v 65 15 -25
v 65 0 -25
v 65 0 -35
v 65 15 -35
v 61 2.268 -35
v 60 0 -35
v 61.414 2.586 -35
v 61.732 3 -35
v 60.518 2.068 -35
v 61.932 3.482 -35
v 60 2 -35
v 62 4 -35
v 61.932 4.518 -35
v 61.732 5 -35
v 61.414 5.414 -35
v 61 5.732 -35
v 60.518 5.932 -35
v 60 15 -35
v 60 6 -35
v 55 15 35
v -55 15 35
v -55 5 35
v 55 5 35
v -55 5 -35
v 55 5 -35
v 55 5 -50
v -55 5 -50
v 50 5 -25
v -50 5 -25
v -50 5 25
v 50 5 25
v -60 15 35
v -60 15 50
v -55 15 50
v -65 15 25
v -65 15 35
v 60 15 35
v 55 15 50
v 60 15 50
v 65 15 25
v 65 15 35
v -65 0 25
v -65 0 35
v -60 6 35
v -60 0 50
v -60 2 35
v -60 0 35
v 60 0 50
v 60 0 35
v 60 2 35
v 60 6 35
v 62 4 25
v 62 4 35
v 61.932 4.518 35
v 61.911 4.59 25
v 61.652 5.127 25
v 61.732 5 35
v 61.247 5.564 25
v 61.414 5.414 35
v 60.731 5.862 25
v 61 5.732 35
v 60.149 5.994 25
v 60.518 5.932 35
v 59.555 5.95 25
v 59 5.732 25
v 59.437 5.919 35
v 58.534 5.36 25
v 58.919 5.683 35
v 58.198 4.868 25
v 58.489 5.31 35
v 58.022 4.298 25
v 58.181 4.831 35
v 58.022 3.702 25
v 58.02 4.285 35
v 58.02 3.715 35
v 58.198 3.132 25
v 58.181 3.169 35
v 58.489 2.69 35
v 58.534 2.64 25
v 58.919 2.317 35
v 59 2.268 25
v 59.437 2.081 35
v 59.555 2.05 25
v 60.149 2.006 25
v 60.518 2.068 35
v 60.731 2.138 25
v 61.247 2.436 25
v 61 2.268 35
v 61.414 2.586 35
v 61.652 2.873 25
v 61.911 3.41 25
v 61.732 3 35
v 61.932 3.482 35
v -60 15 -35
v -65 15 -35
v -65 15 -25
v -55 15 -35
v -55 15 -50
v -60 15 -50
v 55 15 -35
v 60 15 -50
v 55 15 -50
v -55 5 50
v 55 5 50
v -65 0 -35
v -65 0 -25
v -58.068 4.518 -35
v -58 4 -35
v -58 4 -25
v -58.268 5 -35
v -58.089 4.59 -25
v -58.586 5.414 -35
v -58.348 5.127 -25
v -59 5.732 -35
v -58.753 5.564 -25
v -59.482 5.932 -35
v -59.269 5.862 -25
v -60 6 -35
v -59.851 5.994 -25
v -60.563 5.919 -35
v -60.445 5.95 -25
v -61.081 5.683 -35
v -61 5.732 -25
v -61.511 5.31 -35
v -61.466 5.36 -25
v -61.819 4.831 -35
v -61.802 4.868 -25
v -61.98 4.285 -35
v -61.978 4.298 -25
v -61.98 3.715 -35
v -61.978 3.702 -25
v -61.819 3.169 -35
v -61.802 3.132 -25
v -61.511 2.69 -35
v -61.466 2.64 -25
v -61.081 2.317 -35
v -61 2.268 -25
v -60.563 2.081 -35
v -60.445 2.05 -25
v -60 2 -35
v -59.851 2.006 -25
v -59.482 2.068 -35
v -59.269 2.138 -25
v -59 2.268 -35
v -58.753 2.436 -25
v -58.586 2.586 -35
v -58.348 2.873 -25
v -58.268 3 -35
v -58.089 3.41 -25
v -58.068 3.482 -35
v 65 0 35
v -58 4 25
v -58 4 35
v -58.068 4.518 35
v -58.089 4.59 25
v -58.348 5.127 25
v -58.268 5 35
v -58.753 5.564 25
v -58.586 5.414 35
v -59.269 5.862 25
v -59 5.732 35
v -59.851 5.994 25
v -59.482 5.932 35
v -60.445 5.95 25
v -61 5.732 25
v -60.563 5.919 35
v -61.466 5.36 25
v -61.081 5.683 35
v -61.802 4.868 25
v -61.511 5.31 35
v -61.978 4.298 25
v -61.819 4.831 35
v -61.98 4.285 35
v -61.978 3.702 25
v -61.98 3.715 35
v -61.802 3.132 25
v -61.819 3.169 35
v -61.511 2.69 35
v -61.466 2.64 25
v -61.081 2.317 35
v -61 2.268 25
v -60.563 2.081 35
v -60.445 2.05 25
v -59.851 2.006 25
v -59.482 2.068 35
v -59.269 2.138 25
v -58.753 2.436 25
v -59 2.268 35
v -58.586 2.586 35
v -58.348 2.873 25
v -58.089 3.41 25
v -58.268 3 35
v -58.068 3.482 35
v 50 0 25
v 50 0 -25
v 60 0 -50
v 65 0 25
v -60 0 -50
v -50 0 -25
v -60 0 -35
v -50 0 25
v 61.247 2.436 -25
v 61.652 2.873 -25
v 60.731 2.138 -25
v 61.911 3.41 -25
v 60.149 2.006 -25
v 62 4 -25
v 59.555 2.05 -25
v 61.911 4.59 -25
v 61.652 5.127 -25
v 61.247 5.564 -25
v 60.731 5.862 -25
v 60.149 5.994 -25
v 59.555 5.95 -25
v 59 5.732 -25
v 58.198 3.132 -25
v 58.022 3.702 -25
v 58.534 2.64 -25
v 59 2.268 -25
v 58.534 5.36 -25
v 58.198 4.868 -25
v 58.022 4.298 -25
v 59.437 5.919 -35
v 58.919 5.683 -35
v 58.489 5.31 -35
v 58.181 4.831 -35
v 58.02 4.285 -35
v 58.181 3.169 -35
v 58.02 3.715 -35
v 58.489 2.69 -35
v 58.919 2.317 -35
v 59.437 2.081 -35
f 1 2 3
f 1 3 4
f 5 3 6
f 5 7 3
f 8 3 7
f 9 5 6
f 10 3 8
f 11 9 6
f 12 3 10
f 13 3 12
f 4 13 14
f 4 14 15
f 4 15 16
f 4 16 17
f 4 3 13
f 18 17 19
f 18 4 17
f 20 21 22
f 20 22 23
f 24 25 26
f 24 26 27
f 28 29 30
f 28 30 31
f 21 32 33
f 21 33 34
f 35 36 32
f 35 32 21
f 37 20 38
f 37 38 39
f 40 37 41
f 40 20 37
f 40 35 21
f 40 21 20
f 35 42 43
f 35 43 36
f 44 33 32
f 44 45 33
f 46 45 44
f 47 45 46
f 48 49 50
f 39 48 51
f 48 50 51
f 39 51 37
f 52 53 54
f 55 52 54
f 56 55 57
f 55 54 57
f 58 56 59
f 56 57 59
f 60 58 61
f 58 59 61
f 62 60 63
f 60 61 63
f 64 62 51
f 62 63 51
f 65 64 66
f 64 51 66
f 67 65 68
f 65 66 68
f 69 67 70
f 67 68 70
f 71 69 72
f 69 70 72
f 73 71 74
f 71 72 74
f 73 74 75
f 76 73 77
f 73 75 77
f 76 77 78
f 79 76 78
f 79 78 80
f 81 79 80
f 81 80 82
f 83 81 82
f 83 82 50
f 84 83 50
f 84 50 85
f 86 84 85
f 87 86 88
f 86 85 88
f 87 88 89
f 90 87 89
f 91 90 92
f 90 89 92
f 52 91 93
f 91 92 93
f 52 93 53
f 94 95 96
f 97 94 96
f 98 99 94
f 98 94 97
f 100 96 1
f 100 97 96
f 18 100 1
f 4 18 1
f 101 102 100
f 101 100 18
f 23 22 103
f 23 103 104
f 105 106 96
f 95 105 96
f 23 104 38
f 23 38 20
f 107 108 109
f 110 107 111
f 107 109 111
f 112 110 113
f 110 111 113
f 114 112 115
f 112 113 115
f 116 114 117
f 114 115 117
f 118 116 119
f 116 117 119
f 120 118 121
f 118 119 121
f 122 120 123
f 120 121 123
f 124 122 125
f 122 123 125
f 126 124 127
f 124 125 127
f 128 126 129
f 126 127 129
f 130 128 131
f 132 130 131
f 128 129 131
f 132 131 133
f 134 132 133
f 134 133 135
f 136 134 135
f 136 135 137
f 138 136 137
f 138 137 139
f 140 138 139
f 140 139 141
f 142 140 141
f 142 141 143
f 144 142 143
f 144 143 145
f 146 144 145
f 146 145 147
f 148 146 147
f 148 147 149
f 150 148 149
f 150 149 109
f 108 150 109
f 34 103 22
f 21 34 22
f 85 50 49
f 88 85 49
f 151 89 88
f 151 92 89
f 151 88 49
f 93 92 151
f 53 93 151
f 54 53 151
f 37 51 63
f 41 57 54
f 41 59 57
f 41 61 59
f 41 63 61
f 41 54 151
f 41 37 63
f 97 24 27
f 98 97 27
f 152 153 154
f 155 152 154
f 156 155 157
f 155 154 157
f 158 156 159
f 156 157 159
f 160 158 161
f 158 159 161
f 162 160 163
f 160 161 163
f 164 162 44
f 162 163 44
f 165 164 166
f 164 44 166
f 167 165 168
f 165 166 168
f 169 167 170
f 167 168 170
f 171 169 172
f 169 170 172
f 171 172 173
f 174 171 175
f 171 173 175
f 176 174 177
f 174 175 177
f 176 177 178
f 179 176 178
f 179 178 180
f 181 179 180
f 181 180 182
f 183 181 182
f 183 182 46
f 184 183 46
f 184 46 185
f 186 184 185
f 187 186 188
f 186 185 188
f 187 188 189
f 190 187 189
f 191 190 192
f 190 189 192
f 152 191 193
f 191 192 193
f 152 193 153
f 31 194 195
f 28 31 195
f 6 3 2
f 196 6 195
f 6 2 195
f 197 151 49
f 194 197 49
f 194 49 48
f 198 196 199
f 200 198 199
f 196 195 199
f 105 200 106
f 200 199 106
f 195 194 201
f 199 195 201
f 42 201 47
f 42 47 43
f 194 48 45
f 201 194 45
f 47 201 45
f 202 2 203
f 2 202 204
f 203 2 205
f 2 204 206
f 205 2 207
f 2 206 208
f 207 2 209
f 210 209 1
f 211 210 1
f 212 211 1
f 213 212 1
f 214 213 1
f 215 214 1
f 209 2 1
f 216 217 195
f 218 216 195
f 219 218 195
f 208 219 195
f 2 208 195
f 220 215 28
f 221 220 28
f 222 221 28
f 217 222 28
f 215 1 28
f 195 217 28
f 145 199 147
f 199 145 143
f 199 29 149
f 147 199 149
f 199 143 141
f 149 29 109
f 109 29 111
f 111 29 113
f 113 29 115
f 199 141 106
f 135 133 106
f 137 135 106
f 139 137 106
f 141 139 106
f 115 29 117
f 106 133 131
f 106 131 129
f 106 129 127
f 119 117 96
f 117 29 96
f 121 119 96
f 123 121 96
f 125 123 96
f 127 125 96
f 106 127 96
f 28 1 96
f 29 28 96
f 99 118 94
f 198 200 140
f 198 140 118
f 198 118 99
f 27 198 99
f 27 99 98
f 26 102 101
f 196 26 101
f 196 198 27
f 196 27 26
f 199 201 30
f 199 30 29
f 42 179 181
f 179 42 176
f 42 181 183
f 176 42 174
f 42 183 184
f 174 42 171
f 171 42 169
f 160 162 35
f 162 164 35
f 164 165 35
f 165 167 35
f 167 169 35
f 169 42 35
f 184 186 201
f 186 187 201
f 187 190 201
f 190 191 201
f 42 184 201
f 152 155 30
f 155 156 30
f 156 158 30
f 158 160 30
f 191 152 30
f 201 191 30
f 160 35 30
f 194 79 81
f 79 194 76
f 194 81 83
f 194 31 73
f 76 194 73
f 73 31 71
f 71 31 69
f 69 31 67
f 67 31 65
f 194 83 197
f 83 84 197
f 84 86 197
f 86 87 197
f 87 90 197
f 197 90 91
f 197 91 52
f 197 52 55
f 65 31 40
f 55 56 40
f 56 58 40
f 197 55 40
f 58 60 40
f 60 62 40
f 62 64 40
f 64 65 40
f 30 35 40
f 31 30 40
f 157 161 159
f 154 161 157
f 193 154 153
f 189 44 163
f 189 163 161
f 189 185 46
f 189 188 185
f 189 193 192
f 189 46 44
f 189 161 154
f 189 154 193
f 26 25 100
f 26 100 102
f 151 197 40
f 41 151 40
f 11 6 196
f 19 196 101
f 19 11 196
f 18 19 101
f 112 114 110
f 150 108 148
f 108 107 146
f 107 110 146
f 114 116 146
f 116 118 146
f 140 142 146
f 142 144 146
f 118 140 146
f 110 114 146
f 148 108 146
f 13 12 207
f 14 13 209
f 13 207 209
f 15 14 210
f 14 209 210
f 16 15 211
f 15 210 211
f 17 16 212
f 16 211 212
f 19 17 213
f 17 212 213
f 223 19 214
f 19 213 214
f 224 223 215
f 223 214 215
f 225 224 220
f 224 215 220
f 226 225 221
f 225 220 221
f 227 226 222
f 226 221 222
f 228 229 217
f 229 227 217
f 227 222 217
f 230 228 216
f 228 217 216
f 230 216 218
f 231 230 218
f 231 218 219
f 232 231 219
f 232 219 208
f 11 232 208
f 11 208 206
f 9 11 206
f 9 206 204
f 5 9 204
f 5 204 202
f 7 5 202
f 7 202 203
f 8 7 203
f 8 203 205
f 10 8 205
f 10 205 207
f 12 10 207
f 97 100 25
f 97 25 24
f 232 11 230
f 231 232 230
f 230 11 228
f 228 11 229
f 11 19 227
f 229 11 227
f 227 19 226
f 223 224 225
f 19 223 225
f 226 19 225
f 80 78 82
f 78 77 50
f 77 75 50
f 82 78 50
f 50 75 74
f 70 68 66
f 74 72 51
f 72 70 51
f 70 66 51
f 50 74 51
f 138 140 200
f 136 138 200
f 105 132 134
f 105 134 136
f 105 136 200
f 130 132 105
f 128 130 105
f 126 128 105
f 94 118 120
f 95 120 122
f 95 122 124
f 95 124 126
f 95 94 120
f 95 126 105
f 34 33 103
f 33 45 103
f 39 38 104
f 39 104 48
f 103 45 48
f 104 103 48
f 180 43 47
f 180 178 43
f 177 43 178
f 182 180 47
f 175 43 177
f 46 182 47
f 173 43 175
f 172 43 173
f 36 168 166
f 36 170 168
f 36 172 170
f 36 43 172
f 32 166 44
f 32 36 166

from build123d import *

# Parameters (mm, degrees)
SKETCH1_W           = 100
SKETCH1_H           = 50
BOSS_EXTRUDE1_DEPTH = 5
SKETCH2_W           = 130
SKETCH2_H           = 15
BOSS_EXTRUDE2_DEPTH = 10
SKETCH3_W           = 130
SKETCH3_H           = 15
BOSS_EXTRUDE3_DEPTH = 10
SKETCH4_R           = 2
CUT_EXTRUDE1_DEPTH  = 97.695398029
SKETCH5_R           = 2
CUT_EXTRUDE2_DEPTH  = 97.695398029
SKETCH7_W           = 120
SKETCH7_H           = 5
BOSS_EXTRUDE4_DEPTH = 15
SKETCH8_W           = 5
SKETCH8_H           = 15
BOSS_EXTRUDE5_DEPTH = 10
SKETCH11_W          = 120
SKETCH11_H          = 5
BOSS_EXTRUDE6_DEPTH = 15
SKETCH12_W          = 5
SKETCH12_H          = 15
BOSS_EXTRUDE7_DEPTH = 10


with BuildPart() as part:
    # Sketch1 → Boss-Extrude1 (new body)
    with BuildSketch(Plane(origin=(0, 0, 0), x_dir=(1, 0, 0), z_dir=(0, 1, 0))):
        Rectangle(SKETCH1_W, SKETCH1_H)
    extrude(amount=BOSS_EXTRUDE1_DEPTH)

    # Sketch2 → Boss-Extrude2 (add)
    with BuildSketch(Plane.XY.offset(25)):
        with Locations((0, 7.5)):
            Rectangle(SKETCH2_W, SKETCH2_H)
    extrude(amount=BOSS_EXTRUDE2_DEPTH)

    # Sketch3 → Boss-Extrude3 (add)
    with BuildSketch(Plane(origin=(0, 0, -25), x_dir=(-1, 0, 0), z_dir=(0, 0, -1))):
        with Locations((0, 7.5)):
            Rectangle(SKETCH3_W, SKETCH3_H)
    extrude(amount=BOSS_EXTRUDE3_DEPTH)

    # Sketch4 → Cut-Extrude1 (cut, through all)
    with BuildSketch(Plane.XY.offset(35)):
        with Locations((-60, 4)):
            Circle(SKETCH4_R)
    extrude(amount=-CUT_EXTRUDE1_DEPTH, mode=Mode.SUBTRACT)

    # Sketch5 → Cut-Extrude2 (cut, through all)
    with BuildSketch(Plane.XY.offset(35)):
        with Locations((60, 4)):
            Circle(SKETCH5_R)
    extrude(amount=-CUT_EXTRUDE2_DEPTH, mode=Mode.SUBTRACT)

    # Sketch7 → Boss-Extrude4 (add)
    with BuildSketch(Plane.XY.offset(35)):
        with Locations((0, 2.5)):
            Rectangle(SKETCH7_W, SKETCH7_H)
    extrude(amount=BOSS_EXTRUDE4_DEPTH)

    # Sketch8 → Boss-Extrude5 (add)
    with BuildSketch(Plane(origin=(0, 5, 0), x_dir=(1, 0, 0), z_dir=(0, 1, 0))):
        with Locations((-57.5, -42.5)):
            Rectangle(SKETCH8_W, SKETCH8_H)
        with Locations((57.5, -42.5)):
            Rectangle(SKETCH8_W, SKETCH8_H)
    extrude(amount=BOSS_EXTRUDE5_DEPTH)

    # Sketch11 → Boss-Extrude6 (add)
    with BuildSketch(Plane(origin=(0, 0, -35), x_dir=(-1, 0, 0), z_dir=(0, 0, -1))):
        with Locations((0, 2.5)):
            Rectangle(SKETCH11_W, SKETCH11_H)
    extrude(amount=BOSS_EXTRUDE6_DEPTH)

    # Sketch12 → Boss-Extrude7 (add)
    with BuildSketch(Plane(origin=(0, 5, 0), x_dir=(1, 0, 0), z_dir=(0, 1, 0))):
        with Locations((-57.5, 42.5)):
            Rectangle(SKETCH12_W, SKETCH12_H)
        with Locations((57.5, 42.5)):
            Rectangle(SKETCH12_W, SKETCH12_H)
    extrude(amount=BOSS_EXTRUDE7_DEPTH)


solid = part.part
